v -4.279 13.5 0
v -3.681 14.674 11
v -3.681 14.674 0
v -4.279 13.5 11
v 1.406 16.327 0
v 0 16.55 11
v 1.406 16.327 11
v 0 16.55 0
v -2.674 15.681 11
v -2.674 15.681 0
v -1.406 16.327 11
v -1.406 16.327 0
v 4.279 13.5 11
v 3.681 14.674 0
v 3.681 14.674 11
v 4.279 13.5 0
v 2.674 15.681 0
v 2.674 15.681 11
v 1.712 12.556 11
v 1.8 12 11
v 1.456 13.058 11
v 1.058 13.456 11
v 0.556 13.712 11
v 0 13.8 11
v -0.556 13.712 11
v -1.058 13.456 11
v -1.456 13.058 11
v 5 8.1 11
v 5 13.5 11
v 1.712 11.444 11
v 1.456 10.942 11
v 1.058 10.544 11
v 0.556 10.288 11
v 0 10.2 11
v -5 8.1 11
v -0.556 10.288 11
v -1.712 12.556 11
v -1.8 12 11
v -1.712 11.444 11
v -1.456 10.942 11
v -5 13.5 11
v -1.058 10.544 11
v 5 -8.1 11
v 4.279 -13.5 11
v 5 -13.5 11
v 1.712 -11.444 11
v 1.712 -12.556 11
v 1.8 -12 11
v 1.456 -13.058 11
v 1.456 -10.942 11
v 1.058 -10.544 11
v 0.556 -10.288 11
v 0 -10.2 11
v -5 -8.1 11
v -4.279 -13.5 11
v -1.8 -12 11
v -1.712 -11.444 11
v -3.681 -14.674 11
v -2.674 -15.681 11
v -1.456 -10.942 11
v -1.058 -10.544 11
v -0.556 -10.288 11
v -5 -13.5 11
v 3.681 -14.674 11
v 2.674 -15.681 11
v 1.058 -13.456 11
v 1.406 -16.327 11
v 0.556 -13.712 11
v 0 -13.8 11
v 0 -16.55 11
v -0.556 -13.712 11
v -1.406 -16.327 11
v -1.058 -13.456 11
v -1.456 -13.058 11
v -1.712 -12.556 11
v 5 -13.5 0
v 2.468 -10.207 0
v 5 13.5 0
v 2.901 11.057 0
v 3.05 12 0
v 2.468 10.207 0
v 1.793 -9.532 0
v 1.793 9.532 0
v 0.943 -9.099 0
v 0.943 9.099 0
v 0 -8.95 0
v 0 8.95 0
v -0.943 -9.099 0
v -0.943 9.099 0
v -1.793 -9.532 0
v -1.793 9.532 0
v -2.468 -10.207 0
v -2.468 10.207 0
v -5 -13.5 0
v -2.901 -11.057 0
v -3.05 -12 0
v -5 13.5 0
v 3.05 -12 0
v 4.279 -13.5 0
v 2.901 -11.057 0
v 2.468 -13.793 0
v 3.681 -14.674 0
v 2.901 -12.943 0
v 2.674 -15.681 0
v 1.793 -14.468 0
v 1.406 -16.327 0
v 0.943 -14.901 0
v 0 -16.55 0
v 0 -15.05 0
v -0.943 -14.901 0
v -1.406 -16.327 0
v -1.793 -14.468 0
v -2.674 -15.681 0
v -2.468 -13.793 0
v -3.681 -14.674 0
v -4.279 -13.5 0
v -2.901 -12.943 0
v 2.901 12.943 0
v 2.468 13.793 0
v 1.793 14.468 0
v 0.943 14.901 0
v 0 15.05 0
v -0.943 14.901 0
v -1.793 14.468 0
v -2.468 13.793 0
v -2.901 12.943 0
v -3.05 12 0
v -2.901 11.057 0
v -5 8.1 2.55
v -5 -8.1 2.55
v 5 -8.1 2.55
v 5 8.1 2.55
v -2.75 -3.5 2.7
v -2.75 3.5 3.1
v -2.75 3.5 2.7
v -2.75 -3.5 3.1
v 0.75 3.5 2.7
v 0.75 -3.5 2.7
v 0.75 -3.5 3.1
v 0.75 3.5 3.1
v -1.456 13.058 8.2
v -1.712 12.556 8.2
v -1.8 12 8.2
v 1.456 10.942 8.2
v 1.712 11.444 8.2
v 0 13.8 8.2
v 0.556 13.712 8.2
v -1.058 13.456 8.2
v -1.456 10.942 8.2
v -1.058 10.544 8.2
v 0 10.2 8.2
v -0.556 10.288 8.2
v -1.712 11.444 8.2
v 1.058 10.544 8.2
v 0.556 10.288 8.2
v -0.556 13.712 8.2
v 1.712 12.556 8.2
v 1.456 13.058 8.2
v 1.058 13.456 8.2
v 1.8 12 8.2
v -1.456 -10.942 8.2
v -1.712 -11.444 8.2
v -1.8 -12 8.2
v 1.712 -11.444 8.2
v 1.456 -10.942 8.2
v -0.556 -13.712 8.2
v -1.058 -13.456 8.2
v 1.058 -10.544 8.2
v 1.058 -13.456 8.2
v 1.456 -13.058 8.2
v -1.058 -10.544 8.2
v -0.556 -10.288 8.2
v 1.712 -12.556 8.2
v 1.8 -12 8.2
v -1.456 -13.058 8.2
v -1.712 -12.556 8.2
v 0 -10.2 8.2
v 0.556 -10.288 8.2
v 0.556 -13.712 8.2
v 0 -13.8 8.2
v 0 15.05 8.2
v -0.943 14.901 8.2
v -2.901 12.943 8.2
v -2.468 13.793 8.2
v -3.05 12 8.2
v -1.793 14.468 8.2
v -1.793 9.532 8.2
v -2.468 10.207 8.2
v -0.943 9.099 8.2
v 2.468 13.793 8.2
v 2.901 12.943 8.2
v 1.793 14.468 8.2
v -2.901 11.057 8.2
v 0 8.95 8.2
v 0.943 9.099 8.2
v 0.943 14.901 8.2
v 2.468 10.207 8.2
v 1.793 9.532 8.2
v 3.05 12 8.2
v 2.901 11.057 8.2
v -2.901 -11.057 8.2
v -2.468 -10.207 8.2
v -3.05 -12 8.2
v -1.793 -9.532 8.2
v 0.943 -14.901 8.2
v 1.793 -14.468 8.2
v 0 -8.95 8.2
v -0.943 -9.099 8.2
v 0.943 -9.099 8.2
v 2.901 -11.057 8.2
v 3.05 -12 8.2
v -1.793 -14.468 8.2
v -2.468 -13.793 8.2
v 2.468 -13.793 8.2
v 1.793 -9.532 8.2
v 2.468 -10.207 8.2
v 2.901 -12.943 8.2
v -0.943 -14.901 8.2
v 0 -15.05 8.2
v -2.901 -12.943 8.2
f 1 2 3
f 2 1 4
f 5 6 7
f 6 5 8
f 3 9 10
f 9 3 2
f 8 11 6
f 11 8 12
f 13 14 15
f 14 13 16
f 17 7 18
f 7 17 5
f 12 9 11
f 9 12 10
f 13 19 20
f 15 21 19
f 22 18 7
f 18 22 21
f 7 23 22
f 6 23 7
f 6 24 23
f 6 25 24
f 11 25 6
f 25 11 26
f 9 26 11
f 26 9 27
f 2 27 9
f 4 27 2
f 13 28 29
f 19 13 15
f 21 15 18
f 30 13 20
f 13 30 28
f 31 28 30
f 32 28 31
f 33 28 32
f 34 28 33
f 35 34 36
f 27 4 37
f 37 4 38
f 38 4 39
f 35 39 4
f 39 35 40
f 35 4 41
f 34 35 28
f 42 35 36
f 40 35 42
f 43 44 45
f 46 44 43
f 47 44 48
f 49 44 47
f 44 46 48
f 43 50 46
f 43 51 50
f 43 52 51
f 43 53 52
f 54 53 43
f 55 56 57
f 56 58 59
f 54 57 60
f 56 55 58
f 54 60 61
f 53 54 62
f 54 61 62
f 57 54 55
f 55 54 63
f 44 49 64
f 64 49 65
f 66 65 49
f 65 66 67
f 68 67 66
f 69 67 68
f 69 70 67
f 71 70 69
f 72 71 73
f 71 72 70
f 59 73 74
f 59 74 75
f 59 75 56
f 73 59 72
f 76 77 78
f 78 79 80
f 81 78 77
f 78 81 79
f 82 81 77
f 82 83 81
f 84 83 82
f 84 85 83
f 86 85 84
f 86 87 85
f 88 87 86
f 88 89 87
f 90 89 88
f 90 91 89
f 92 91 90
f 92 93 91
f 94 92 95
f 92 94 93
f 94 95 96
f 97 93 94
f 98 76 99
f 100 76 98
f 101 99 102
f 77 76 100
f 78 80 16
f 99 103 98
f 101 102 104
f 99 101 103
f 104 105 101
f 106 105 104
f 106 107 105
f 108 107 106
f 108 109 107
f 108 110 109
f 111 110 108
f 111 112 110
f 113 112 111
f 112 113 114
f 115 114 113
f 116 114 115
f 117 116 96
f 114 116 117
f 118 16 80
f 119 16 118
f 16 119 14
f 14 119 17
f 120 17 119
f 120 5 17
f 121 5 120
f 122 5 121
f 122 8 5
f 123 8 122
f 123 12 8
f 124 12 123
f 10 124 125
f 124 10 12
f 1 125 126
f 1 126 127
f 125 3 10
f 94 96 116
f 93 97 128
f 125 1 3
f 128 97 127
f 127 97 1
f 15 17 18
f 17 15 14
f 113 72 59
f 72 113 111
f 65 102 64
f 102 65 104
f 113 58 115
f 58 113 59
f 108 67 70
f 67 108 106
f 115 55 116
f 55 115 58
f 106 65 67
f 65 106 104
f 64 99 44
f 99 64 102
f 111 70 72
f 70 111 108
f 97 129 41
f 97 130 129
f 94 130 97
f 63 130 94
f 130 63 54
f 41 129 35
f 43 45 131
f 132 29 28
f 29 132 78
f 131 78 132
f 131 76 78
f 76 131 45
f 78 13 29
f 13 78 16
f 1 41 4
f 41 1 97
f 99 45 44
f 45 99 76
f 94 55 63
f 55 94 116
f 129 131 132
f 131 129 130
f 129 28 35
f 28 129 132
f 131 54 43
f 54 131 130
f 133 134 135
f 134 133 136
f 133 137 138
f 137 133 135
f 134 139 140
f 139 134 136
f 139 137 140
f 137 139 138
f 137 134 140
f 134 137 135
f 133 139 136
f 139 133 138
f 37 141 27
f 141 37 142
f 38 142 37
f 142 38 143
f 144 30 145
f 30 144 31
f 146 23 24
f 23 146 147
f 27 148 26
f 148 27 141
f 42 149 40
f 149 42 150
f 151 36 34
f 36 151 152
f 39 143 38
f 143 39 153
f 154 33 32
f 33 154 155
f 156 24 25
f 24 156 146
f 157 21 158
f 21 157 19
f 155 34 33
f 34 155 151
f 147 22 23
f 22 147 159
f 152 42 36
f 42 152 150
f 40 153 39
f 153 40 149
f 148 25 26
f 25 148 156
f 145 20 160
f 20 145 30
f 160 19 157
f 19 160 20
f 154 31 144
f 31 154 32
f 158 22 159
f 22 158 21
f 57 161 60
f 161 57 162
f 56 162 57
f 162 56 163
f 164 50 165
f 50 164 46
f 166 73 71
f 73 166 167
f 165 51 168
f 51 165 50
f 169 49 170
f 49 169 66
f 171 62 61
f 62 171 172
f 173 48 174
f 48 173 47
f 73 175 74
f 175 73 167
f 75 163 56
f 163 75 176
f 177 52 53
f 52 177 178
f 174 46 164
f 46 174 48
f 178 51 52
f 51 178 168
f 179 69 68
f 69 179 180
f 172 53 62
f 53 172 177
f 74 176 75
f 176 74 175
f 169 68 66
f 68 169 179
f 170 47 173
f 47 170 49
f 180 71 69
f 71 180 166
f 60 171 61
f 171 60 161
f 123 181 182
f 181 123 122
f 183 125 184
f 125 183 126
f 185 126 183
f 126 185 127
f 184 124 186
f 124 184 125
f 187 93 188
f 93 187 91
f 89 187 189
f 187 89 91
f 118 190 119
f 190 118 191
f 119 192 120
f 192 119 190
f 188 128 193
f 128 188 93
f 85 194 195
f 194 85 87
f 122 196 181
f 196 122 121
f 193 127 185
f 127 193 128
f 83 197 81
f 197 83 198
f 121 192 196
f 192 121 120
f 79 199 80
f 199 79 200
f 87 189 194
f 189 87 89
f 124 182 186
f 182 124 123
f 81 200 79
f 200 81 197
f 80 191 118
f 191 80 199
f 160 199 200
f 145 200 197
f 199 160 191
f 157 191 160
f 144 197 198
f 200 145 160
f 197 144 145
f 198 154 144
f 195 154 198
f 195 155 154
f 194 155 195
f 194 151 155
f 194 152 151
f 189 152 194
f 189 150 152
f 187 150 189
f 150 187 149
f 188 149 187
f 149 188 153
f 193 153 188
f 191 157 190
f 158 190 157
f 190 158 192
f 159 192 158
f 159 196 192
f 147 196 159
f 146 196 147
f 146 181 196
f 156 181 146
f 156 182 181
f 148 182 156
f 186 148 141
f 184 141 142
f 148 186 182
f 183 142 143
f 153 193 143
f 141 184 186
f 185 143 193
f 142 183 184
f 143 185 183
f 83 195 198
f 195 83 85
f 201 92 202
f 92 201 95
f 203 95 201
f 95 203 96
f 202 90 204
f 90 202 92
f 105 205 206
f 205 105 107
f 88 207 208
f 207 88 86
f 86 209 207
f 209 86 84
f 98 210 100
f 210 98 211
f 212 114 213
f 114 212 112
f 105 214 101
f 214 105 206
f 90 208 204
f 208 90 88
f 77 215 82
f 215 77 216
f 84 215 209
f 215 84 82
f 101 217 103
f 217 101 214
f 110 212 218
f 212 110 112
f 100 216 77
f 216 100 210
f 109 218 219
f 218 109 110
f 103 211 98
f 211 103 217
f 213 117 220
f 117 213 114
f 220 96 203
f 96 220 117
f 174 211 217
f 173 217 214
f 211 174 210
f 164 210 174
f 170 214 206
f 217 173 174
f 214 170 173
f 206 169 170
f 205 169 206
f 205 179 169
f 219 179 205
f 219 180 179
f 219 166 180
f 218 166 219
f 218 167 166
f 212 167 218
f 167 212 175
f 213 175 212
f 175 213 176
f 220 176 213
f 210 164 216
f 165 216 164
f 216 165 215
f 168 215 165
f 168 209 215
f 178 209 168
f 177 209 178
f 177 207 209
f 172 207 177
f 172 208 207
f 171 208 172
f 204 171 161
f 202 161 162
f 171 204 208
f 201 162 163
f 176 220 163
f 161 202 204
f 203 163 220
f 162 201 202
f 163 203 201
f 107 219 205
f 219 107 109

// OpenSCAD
// EMAX nighthawk accessories  - a OpenSCAD 
// Copyright (C) 2016  Gerard Valade

// This program is free software: you can redistribute it and/or modify
// it under the terms of the GNU General Public License as published by
// the Free Software Foundation, either version 3 of the License, or
// (at your option) any later version.

// This program is distributed in the hope that it will be useful,
// but WITHOUT ANY WARRANTY; without even the implied warranty of
// MERCHANTABILITY or FITNESS FOR A PARTICULAR PURPOSE.  See the
// GNU General Public License for more details.

// You should have received a copy of the GNU General Public License
// along with this program.  If not, see <http://www.gnu.org/licenses/>.

$fn=30;


M3_dia = 3.6;
M3_hole = 2.5;
M3_hexa = 5.4+0.4;
M3_head_hole = 5.4+0.7;

module hexaprismx(
	ri =  1.0,  // radius of inscribed circle
	h  =  1.0)  // height of hexaprism
{ // -----------------------------------------------

	ra = ri*2/sqrt(3);
	cylinder(r = ra, h=h, $fn=6, center=false);
}



xt60_length = 10;//21;
xt60_width = 27;
xt60_heigth = 11;

function xt60_length() = xt60_length;
function xt60_width() = xt60_width;
function xt60_heigth() = xt60_heigth;


module xt60_footprint(cut=4)
{
	hh = 8.5;
	difference() {
		union() {
			translate([0, 0, hh/2-0.05]) cube([xt60_length+0.05, 16.2, hh], center=true);
			//translate([-16 + 0.02, 0, -2.2+4]) cube([16, 15.2, 11.5], center=true);
		}
		//translate([0, 8.1+1, hh/2+4]) rotate([45, 0, 0]) cube([xt60_length-4.5,cut,cut], center=true);
		translate([(xt60_length-8)/2 , 0, hh-0.8/2]) cube([3.5, 7, 0.4], center=true);
	}
}
	

module xt60_screw_hole(dia=2.2, h=10, $fn=20)
{
	for(x=[0]) for(y=[1, -1]) translate([x*8, y*12, 0]) {
		cylinder(d=dia, h=h, center=true);
	}	
}

module xt60_bracket()
{
	module plain()
	{
		translate([0,0,(xt60_heigth)/2])  cube([xt60_length, xt60_width, xt60_heigth], center=true);
		translate([0,0,(xt60_heigth)/2]) xt60_screw_hole(dia=M3_head_hole+3, h=xt60_heigth);
	}
	module hole()
	{
		translate([0, 0, 0]) {
			xt60_footprint();
		}
	}

	translate([0, 0, xt60_heigth]) rotate([0, 180, 0]) {
		difference()
		{
			plain();
			translate([0, 0, 0]) hole();
			translate([0, 0, xt60_heigth/2]) xt60_screw_hole(M3_dia, h=xt60_heigth+1);
			translate([0, 0, xt60_heigth/2+2.8]) xt60_screw_hole(M3_head_hole, h=xt60_heigth);
		}
	}
}



translate([0, 0, 0])  rotate([0, 0, 0]) xt60_bracket();
